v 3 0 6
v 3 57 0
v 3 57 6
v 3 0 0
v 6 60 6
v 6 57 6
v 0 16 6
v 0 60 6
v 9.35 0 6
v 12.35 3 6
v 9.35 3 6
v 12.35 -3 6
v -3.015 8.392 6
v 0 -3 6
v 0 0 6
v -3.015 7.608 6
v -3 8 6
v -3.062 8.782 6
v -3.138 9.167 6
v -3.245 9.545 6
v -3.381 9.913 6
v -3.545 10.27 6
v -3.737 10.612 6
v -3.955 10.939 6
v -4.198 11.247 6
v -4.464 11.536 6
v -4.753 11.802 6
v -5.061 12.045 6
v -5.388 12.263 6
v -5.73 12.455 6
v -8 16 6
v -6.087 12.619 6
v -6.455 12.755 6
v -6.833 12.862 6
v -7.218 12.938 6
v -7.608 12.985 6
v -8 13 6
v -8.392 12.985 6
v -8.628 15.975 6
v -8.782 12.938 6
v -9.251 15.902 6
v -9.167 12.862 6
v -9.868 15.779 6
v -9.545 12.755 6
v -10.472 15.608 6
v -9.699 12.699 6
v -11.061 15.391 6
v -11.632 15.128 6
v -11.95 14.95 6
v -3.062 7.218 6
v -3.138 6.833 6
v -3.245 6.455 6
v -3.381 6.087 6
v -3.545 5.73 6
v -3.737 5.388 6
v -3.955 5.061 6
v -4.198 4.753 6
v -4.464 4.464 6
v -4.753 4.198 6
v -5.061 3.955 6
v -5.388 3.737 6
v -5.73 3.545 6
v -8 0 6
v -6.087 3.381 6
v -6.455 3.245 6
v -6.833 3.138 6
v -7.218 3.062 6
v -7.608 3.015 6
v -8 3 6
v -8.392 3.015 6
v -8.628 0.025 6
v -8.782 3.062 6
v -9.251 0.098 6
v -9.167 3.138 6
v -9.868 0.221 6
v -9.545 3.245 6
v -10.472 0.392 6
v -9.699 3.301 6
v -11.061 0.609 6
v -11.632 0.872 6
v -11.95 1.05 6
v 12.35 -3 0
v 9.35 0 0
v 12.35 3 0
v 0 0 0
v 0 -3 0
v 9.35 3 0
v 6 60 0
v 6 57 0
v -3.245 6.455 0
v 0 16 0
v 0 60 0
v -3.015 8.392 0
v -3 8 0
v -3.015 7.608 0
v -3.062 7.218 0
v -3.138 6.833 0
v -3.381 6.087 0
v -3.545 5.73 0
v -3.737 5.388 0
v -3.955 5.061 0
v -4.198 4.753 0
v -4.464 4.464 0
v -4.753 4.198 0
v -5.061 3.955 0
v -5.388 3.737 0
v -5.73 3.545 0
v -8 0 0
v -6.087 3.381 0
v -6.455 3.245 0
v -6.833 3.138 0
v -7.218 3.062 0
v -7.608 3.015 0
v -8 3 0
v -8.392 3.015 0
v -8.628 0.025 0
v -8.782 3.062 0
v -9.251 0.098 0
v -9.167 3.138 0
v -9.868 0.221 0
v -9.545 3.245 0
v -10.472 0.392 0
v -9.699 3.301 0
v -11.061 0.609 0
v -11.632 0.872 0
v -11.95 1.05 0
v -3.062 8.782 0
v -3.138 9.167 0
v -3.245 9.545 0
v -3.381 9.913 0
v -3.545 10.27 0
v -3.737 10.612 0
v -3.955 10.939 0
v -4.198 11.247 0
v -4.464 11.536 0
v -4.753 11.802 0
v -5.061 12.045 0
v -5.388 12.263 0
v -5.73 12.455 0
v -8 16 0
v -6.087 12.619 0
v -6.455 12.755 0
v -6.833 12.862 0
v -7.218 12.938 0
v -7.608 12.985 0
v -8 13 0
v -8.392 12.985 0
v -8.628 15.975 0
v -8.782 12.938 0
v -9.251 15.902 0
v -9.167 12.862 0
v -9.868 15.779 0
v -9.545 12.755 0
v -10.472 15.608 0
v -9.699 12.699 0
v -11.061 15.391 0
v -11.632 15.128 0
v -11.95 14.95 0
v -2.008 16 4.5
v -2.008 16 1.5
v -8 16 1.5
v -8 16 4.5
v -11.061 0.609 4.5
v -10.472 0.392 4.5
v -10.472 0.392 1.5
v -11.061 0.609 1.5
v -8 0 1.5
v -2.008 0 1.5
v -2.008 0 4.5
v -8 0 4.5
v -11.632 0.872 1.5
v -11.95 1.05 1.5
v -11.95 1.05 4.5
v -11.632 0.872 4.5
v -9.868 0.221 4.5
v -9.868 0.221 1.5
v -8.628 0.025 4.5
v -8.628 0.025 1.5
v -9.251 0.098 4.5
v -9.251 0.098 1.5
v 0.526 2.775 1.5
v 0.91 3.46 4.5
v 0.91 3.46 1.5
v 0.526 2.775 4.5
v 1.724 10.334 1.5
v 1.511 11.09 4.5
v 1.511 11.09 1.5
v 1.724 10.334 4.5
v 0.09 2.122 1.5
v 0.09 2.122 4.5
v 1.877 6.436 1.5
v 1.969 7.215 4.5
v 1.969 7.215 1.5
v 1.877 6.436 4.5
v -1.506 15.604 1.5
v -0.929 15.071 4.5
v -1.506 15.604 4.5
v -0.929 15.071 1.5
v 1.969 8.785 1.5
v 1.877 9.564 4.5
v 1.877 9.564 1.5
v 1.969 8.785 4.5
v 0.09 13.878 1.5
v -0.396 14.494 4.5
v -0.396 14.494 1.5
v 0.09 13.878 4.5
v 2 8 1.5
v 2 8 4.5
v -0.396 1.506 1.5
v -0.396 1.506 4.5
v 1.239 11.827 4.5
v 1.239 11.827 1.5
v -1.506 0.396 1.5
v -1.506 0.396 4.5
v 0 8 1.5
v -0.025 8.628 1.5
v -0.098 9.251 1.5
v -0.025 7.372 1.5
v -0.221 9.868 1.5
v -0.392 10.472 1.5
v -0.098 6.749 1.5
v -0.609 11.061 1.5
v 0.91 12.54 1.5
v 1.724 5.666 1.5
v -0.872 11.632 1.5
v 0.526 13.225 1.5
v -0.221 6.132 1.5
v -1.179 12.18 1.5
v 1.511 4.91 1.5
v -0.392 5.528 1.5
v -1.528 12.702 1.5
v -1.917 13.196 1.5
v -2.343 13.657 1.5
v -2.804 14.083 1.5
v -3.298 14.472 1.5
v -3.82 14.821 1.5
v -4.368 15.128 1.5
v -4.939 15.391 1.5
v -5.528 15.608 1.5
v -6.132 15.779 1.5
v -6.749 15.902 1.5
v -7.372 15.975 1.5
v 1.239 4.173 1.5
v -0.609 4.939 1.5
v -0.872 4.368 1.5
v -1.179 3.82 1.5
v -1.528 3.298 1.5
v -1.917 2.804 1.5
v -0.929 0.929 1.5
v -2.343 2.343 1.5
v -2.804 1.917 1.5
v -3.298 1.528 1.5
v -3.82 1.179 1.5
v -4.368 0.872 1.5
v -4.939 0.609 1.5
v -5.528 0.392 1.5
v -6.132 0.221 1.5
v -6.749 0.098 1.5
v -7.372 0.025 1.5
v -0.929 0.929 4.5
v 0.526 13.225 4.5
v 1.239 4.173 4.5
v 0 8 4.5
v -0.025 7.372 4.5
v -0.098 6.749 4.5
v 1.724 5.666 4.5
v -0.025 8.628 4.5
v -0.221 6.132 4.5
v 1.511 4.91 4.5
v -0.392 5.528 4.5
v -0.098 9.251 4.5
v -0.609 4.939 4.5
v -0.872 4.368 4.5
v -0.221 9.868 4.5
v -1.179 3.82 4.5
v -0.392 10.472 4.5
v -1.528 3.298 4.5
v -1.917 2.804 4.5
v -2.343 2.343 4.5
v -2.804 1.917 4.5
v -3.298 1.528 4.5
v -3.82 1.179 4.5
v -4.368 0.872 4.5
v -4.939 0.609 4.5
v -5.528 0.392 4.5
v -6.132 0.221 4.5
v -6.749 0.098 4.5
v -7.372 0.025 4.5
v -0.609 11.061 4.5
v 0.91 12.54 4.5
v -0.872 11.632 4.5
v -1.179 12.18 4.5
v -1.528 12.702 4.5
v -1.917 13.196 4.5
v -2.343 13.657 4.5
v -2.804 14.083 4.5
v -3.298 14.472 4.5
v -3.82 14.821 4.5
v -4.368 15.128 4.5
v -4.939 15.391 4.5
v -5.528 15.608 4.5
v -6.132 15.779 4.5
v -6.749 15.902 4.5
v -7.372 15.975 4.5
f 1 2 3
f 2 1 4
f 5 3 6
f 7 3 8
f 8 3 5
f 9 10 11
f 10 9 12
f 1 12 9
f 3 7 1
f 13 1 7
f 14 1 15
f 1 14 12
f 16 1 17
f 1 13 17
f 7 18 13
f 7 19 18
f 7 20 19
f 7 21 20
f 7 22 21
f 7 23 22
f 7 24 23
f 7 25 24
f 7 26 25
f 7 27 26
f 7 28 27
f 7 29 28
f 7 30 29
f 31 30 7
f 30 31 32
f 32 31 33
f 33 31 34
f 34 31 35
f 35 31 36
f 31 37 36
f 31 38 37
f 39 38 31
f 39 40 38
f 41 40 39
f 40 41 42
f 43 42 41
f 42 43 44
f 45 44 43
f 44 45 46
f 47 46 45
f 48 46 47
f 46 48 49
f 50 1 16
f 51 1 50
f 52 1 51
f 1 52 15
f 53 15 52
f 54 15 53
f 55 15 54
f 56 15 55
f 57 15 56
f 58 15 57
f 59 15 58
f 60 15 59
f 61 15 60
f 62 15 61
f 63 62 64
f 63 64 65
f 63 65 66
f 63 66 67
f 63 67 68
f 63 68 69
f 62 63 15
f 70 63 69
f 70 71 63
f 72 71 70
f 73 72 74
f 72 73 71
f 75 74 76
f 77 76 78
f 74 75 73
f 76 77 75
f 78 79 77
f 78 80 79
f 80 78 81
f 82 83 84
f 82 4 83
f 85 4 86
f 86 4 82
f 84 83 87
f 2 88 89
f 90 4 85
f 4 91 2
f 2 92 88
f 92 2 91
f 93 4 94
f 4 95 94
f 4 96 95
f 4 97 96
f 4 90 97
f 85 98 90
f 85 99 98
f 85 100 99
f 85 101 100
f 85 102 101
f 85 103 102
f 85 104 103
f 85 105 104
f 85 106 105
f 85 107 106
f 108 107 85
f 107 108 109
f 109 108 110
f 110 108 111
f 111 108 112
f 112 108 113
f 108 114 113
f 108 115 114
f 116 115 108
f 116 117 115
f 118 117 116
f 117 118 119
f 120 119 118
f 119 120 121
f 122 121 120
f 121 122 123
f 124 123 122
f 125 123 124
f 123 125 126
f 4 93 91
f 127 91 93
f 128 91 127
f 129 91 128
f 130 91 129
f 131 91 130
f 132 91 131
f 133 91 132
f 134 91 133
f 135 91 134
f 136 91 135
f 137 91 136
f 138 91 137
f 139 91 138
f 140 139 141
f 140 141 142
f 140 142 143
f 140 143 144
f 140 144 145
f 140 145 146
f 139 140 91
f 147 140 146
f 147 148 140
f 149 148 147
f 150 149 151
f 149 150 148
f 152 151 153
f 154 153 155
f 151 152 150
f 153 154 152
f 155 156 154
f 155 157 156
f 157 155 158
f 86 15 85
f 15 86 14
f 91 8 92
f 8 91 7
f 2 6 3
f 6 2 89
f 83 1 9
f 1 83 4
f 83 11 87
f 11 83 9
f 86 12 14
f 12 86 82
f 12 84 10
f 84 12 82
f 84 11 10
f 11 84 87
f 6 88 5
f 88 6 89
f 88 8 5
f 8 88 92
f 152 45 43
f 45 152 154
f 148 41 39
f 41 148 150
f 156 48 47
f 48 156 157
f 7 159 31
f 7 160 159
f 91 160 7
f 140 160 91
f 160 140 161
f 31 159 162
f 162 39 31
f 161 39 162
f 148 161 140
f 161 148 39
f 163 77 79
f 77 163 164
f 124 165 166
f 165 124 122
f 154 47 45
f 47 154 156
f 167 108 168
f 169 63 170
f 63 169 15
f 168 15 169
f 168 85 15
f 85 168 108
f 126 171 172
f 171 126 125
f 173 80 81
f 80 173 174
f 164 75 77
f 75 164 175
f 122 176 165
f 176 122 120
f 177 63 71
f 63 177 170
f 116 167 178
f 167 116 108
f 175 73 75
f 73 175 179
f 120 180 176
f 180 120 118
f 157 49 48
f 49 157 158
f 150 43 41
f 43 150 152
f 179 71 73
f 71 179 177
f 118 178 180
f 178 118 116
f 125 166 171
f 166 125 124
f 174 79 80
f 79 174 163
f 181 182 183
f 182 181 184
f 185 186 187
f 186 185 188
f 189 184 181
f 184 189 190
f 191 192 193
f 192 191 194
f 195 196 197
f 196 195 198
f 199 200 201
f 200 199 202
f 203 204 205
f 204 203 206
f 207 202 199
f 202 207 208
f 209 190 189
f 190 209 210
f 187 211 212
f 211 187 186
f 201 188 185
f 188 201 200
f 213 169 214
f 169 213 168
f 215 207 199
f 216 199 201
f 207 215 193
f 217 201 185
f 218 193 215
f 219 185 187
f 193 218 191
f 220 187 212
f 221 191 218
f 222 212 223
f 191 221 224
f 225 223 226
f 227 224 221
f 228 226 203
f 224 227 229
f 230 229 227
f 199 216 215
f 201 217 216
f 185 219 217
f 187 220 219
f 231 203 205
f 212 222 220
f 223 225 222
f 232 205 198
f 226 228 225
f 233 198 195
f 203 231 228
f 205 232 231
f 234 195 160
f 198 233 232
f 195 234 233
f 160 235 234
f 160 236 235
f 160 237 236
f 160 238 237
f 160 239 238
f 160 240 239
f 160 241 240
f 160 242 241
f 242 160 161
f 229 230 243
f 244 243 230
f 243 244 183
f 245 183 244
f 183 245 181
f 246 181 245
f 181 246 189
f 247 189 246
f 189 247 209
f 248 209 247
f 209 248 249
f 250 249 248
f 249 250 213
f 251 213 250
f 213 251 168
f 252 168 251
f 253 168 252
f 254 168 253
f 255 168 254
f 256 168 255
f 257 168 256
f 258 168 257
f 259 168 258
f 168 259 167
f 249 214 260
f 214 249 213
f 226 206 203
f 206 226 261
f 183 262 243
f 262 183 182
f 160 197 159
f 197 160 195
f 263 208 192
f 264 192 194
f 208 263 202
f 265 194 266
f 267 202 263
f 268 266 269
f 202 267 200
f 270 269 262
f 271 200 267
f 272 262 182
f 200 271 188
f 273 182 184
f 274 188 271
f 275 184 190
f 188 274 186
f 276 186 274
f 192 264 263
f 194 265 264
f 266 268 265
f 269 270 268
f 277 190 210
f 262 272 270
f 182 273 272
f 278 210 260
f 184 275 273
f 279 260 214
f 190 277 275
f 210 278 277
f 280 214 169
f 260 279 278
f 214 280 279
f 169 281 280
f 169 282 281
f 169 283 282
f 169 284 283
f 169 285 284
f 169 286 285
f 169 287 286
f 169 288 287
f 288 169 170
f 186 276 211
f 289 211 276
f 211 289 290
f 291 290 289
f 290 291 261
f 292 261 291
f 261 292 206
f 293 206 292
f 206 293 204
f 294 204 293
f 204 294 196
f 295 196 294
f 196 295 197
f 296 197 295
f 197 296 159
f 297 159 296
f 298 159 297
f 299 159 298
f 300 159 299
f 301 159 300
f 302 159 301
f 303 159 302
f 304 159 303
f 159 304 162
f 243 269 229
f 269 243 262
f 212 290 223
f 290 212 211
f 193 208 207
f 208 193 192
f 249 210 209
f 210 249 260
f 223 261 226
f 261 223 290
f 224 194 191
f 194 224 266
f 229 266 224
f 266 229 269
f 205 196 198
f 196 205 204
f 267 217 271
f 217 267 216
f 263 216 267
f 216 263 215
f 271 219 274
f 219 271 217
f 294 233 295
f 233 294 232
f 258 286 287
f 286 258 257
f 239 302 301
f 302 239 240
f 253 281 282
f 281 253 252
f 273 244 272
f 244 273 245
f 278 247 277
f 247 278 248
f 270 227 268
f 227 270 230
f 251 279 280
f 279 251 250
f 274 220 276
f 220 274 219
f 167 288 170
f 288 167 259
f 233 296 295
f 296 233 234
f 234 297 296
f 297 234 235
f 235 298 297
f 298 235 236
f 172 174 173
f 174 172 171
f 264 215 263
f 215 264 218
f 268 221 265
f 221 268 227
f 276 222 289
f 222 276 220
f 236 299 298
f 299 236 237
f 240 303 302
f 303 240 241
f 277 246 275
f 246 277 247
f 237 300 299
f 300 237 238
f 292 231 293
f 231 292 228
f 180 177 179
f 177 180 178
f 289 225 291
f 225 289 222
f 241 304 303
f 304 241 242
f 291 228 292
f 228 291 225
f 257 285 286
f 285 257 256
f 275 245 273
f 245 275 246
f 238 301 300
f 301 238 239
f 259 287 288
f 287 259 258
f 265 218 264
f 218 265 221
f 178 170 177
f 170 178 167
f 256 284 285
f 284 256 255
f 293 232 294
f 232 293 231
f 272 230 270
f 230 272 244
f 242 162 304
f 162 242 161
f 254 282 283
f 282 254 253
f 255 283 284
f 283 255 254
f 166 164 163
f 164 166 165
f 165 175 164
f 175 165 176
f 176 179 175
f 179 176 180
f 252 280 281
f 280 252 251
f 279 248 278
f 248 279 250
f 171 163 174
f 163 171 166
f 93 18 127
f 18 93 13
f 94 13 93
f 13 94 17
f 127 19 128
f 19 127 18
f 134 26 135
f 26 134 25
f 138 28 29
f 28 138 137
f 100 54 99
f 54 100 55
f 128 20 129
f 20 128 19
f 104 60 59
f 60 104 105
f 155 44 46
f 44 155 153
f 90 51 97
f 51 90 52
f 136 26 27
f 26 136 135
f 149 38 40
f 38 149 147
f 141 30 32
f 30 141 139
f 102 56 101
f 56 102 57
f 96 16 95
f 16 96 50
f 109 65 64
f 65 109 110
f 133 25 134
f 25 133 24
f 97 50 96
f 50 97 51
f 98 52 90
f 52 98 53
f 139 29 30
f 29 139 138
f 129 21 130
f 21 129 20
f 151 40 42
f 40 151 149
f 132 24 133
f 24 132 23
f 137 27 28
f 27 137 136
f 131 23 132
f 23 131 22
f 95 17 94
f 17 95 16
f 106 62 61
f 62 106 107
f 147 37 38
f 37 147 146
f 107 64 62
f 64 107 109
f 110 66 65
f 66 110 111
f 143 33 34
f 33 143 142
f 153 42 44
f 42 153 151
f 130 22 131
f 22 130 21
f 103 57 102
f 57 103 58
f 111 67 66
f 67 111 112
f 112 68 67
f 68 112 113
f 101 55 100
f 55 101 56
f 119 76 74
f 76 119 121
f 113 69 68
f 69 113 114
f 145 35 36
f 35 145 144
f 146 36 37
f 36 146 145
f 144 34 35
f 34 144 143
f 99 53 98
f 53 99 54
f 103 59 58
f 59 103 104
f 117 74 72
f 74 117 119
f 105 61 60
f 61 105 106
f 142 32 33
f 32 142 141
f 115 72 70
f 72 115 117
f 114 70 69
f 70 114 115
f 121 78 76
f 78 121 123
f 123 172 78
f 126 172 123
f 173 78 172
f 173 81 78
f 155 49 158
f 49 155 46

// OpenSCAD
thickness = 6.35;
width = 57;
height = 6;
wall = 3;
cable_dia = 10;
out_cable_dia = wall+cable_dia+wall;
tie_height = 3;

module back_cable_clip()
{
  difference() {
    union() {
      cube([wall, width, height]);
      
      translate([0, -wall, 0])
        cube([wall+thickness, wall, height]);
      translate([wall+thickness, -wall, 0])
        cube([wall, wall+wall, height]);
      translate([0, width, 0])
        cube([wall+wall, wall, height]);
      
      hull() {
        cube([wall, out_cable_dia, height]);
        translate([-out_cable_dia/2, out_cable_dia/2, 0])
          cylinder(r=out_cable_dia/2, h=height, $fn=80);
      }
    }
    union() {
      translate([-out_cable_dia/2, out_cable_dia/2, 0])
        cylinder(r=cable_dia/2, h=height, $fn=80);
      translate([-out_cable_dia/2+3, out_cable_dia/2, 0])
        rotate([0, 0, -45+180]) 
          cube([20,20,height]);
      
      translate([-out_cable_dia/2, out_cable_dia/2, height/2-tie_height/2]) {
        difference() {
          cylinder(r=out_cable_dia/2+2, h=tie_height, $fn=80);
          cylinder(r=out_cable_dia/2, h=tie_height, $fn=80);
        }
      }
    }
  }
}

back_cable_clip();
